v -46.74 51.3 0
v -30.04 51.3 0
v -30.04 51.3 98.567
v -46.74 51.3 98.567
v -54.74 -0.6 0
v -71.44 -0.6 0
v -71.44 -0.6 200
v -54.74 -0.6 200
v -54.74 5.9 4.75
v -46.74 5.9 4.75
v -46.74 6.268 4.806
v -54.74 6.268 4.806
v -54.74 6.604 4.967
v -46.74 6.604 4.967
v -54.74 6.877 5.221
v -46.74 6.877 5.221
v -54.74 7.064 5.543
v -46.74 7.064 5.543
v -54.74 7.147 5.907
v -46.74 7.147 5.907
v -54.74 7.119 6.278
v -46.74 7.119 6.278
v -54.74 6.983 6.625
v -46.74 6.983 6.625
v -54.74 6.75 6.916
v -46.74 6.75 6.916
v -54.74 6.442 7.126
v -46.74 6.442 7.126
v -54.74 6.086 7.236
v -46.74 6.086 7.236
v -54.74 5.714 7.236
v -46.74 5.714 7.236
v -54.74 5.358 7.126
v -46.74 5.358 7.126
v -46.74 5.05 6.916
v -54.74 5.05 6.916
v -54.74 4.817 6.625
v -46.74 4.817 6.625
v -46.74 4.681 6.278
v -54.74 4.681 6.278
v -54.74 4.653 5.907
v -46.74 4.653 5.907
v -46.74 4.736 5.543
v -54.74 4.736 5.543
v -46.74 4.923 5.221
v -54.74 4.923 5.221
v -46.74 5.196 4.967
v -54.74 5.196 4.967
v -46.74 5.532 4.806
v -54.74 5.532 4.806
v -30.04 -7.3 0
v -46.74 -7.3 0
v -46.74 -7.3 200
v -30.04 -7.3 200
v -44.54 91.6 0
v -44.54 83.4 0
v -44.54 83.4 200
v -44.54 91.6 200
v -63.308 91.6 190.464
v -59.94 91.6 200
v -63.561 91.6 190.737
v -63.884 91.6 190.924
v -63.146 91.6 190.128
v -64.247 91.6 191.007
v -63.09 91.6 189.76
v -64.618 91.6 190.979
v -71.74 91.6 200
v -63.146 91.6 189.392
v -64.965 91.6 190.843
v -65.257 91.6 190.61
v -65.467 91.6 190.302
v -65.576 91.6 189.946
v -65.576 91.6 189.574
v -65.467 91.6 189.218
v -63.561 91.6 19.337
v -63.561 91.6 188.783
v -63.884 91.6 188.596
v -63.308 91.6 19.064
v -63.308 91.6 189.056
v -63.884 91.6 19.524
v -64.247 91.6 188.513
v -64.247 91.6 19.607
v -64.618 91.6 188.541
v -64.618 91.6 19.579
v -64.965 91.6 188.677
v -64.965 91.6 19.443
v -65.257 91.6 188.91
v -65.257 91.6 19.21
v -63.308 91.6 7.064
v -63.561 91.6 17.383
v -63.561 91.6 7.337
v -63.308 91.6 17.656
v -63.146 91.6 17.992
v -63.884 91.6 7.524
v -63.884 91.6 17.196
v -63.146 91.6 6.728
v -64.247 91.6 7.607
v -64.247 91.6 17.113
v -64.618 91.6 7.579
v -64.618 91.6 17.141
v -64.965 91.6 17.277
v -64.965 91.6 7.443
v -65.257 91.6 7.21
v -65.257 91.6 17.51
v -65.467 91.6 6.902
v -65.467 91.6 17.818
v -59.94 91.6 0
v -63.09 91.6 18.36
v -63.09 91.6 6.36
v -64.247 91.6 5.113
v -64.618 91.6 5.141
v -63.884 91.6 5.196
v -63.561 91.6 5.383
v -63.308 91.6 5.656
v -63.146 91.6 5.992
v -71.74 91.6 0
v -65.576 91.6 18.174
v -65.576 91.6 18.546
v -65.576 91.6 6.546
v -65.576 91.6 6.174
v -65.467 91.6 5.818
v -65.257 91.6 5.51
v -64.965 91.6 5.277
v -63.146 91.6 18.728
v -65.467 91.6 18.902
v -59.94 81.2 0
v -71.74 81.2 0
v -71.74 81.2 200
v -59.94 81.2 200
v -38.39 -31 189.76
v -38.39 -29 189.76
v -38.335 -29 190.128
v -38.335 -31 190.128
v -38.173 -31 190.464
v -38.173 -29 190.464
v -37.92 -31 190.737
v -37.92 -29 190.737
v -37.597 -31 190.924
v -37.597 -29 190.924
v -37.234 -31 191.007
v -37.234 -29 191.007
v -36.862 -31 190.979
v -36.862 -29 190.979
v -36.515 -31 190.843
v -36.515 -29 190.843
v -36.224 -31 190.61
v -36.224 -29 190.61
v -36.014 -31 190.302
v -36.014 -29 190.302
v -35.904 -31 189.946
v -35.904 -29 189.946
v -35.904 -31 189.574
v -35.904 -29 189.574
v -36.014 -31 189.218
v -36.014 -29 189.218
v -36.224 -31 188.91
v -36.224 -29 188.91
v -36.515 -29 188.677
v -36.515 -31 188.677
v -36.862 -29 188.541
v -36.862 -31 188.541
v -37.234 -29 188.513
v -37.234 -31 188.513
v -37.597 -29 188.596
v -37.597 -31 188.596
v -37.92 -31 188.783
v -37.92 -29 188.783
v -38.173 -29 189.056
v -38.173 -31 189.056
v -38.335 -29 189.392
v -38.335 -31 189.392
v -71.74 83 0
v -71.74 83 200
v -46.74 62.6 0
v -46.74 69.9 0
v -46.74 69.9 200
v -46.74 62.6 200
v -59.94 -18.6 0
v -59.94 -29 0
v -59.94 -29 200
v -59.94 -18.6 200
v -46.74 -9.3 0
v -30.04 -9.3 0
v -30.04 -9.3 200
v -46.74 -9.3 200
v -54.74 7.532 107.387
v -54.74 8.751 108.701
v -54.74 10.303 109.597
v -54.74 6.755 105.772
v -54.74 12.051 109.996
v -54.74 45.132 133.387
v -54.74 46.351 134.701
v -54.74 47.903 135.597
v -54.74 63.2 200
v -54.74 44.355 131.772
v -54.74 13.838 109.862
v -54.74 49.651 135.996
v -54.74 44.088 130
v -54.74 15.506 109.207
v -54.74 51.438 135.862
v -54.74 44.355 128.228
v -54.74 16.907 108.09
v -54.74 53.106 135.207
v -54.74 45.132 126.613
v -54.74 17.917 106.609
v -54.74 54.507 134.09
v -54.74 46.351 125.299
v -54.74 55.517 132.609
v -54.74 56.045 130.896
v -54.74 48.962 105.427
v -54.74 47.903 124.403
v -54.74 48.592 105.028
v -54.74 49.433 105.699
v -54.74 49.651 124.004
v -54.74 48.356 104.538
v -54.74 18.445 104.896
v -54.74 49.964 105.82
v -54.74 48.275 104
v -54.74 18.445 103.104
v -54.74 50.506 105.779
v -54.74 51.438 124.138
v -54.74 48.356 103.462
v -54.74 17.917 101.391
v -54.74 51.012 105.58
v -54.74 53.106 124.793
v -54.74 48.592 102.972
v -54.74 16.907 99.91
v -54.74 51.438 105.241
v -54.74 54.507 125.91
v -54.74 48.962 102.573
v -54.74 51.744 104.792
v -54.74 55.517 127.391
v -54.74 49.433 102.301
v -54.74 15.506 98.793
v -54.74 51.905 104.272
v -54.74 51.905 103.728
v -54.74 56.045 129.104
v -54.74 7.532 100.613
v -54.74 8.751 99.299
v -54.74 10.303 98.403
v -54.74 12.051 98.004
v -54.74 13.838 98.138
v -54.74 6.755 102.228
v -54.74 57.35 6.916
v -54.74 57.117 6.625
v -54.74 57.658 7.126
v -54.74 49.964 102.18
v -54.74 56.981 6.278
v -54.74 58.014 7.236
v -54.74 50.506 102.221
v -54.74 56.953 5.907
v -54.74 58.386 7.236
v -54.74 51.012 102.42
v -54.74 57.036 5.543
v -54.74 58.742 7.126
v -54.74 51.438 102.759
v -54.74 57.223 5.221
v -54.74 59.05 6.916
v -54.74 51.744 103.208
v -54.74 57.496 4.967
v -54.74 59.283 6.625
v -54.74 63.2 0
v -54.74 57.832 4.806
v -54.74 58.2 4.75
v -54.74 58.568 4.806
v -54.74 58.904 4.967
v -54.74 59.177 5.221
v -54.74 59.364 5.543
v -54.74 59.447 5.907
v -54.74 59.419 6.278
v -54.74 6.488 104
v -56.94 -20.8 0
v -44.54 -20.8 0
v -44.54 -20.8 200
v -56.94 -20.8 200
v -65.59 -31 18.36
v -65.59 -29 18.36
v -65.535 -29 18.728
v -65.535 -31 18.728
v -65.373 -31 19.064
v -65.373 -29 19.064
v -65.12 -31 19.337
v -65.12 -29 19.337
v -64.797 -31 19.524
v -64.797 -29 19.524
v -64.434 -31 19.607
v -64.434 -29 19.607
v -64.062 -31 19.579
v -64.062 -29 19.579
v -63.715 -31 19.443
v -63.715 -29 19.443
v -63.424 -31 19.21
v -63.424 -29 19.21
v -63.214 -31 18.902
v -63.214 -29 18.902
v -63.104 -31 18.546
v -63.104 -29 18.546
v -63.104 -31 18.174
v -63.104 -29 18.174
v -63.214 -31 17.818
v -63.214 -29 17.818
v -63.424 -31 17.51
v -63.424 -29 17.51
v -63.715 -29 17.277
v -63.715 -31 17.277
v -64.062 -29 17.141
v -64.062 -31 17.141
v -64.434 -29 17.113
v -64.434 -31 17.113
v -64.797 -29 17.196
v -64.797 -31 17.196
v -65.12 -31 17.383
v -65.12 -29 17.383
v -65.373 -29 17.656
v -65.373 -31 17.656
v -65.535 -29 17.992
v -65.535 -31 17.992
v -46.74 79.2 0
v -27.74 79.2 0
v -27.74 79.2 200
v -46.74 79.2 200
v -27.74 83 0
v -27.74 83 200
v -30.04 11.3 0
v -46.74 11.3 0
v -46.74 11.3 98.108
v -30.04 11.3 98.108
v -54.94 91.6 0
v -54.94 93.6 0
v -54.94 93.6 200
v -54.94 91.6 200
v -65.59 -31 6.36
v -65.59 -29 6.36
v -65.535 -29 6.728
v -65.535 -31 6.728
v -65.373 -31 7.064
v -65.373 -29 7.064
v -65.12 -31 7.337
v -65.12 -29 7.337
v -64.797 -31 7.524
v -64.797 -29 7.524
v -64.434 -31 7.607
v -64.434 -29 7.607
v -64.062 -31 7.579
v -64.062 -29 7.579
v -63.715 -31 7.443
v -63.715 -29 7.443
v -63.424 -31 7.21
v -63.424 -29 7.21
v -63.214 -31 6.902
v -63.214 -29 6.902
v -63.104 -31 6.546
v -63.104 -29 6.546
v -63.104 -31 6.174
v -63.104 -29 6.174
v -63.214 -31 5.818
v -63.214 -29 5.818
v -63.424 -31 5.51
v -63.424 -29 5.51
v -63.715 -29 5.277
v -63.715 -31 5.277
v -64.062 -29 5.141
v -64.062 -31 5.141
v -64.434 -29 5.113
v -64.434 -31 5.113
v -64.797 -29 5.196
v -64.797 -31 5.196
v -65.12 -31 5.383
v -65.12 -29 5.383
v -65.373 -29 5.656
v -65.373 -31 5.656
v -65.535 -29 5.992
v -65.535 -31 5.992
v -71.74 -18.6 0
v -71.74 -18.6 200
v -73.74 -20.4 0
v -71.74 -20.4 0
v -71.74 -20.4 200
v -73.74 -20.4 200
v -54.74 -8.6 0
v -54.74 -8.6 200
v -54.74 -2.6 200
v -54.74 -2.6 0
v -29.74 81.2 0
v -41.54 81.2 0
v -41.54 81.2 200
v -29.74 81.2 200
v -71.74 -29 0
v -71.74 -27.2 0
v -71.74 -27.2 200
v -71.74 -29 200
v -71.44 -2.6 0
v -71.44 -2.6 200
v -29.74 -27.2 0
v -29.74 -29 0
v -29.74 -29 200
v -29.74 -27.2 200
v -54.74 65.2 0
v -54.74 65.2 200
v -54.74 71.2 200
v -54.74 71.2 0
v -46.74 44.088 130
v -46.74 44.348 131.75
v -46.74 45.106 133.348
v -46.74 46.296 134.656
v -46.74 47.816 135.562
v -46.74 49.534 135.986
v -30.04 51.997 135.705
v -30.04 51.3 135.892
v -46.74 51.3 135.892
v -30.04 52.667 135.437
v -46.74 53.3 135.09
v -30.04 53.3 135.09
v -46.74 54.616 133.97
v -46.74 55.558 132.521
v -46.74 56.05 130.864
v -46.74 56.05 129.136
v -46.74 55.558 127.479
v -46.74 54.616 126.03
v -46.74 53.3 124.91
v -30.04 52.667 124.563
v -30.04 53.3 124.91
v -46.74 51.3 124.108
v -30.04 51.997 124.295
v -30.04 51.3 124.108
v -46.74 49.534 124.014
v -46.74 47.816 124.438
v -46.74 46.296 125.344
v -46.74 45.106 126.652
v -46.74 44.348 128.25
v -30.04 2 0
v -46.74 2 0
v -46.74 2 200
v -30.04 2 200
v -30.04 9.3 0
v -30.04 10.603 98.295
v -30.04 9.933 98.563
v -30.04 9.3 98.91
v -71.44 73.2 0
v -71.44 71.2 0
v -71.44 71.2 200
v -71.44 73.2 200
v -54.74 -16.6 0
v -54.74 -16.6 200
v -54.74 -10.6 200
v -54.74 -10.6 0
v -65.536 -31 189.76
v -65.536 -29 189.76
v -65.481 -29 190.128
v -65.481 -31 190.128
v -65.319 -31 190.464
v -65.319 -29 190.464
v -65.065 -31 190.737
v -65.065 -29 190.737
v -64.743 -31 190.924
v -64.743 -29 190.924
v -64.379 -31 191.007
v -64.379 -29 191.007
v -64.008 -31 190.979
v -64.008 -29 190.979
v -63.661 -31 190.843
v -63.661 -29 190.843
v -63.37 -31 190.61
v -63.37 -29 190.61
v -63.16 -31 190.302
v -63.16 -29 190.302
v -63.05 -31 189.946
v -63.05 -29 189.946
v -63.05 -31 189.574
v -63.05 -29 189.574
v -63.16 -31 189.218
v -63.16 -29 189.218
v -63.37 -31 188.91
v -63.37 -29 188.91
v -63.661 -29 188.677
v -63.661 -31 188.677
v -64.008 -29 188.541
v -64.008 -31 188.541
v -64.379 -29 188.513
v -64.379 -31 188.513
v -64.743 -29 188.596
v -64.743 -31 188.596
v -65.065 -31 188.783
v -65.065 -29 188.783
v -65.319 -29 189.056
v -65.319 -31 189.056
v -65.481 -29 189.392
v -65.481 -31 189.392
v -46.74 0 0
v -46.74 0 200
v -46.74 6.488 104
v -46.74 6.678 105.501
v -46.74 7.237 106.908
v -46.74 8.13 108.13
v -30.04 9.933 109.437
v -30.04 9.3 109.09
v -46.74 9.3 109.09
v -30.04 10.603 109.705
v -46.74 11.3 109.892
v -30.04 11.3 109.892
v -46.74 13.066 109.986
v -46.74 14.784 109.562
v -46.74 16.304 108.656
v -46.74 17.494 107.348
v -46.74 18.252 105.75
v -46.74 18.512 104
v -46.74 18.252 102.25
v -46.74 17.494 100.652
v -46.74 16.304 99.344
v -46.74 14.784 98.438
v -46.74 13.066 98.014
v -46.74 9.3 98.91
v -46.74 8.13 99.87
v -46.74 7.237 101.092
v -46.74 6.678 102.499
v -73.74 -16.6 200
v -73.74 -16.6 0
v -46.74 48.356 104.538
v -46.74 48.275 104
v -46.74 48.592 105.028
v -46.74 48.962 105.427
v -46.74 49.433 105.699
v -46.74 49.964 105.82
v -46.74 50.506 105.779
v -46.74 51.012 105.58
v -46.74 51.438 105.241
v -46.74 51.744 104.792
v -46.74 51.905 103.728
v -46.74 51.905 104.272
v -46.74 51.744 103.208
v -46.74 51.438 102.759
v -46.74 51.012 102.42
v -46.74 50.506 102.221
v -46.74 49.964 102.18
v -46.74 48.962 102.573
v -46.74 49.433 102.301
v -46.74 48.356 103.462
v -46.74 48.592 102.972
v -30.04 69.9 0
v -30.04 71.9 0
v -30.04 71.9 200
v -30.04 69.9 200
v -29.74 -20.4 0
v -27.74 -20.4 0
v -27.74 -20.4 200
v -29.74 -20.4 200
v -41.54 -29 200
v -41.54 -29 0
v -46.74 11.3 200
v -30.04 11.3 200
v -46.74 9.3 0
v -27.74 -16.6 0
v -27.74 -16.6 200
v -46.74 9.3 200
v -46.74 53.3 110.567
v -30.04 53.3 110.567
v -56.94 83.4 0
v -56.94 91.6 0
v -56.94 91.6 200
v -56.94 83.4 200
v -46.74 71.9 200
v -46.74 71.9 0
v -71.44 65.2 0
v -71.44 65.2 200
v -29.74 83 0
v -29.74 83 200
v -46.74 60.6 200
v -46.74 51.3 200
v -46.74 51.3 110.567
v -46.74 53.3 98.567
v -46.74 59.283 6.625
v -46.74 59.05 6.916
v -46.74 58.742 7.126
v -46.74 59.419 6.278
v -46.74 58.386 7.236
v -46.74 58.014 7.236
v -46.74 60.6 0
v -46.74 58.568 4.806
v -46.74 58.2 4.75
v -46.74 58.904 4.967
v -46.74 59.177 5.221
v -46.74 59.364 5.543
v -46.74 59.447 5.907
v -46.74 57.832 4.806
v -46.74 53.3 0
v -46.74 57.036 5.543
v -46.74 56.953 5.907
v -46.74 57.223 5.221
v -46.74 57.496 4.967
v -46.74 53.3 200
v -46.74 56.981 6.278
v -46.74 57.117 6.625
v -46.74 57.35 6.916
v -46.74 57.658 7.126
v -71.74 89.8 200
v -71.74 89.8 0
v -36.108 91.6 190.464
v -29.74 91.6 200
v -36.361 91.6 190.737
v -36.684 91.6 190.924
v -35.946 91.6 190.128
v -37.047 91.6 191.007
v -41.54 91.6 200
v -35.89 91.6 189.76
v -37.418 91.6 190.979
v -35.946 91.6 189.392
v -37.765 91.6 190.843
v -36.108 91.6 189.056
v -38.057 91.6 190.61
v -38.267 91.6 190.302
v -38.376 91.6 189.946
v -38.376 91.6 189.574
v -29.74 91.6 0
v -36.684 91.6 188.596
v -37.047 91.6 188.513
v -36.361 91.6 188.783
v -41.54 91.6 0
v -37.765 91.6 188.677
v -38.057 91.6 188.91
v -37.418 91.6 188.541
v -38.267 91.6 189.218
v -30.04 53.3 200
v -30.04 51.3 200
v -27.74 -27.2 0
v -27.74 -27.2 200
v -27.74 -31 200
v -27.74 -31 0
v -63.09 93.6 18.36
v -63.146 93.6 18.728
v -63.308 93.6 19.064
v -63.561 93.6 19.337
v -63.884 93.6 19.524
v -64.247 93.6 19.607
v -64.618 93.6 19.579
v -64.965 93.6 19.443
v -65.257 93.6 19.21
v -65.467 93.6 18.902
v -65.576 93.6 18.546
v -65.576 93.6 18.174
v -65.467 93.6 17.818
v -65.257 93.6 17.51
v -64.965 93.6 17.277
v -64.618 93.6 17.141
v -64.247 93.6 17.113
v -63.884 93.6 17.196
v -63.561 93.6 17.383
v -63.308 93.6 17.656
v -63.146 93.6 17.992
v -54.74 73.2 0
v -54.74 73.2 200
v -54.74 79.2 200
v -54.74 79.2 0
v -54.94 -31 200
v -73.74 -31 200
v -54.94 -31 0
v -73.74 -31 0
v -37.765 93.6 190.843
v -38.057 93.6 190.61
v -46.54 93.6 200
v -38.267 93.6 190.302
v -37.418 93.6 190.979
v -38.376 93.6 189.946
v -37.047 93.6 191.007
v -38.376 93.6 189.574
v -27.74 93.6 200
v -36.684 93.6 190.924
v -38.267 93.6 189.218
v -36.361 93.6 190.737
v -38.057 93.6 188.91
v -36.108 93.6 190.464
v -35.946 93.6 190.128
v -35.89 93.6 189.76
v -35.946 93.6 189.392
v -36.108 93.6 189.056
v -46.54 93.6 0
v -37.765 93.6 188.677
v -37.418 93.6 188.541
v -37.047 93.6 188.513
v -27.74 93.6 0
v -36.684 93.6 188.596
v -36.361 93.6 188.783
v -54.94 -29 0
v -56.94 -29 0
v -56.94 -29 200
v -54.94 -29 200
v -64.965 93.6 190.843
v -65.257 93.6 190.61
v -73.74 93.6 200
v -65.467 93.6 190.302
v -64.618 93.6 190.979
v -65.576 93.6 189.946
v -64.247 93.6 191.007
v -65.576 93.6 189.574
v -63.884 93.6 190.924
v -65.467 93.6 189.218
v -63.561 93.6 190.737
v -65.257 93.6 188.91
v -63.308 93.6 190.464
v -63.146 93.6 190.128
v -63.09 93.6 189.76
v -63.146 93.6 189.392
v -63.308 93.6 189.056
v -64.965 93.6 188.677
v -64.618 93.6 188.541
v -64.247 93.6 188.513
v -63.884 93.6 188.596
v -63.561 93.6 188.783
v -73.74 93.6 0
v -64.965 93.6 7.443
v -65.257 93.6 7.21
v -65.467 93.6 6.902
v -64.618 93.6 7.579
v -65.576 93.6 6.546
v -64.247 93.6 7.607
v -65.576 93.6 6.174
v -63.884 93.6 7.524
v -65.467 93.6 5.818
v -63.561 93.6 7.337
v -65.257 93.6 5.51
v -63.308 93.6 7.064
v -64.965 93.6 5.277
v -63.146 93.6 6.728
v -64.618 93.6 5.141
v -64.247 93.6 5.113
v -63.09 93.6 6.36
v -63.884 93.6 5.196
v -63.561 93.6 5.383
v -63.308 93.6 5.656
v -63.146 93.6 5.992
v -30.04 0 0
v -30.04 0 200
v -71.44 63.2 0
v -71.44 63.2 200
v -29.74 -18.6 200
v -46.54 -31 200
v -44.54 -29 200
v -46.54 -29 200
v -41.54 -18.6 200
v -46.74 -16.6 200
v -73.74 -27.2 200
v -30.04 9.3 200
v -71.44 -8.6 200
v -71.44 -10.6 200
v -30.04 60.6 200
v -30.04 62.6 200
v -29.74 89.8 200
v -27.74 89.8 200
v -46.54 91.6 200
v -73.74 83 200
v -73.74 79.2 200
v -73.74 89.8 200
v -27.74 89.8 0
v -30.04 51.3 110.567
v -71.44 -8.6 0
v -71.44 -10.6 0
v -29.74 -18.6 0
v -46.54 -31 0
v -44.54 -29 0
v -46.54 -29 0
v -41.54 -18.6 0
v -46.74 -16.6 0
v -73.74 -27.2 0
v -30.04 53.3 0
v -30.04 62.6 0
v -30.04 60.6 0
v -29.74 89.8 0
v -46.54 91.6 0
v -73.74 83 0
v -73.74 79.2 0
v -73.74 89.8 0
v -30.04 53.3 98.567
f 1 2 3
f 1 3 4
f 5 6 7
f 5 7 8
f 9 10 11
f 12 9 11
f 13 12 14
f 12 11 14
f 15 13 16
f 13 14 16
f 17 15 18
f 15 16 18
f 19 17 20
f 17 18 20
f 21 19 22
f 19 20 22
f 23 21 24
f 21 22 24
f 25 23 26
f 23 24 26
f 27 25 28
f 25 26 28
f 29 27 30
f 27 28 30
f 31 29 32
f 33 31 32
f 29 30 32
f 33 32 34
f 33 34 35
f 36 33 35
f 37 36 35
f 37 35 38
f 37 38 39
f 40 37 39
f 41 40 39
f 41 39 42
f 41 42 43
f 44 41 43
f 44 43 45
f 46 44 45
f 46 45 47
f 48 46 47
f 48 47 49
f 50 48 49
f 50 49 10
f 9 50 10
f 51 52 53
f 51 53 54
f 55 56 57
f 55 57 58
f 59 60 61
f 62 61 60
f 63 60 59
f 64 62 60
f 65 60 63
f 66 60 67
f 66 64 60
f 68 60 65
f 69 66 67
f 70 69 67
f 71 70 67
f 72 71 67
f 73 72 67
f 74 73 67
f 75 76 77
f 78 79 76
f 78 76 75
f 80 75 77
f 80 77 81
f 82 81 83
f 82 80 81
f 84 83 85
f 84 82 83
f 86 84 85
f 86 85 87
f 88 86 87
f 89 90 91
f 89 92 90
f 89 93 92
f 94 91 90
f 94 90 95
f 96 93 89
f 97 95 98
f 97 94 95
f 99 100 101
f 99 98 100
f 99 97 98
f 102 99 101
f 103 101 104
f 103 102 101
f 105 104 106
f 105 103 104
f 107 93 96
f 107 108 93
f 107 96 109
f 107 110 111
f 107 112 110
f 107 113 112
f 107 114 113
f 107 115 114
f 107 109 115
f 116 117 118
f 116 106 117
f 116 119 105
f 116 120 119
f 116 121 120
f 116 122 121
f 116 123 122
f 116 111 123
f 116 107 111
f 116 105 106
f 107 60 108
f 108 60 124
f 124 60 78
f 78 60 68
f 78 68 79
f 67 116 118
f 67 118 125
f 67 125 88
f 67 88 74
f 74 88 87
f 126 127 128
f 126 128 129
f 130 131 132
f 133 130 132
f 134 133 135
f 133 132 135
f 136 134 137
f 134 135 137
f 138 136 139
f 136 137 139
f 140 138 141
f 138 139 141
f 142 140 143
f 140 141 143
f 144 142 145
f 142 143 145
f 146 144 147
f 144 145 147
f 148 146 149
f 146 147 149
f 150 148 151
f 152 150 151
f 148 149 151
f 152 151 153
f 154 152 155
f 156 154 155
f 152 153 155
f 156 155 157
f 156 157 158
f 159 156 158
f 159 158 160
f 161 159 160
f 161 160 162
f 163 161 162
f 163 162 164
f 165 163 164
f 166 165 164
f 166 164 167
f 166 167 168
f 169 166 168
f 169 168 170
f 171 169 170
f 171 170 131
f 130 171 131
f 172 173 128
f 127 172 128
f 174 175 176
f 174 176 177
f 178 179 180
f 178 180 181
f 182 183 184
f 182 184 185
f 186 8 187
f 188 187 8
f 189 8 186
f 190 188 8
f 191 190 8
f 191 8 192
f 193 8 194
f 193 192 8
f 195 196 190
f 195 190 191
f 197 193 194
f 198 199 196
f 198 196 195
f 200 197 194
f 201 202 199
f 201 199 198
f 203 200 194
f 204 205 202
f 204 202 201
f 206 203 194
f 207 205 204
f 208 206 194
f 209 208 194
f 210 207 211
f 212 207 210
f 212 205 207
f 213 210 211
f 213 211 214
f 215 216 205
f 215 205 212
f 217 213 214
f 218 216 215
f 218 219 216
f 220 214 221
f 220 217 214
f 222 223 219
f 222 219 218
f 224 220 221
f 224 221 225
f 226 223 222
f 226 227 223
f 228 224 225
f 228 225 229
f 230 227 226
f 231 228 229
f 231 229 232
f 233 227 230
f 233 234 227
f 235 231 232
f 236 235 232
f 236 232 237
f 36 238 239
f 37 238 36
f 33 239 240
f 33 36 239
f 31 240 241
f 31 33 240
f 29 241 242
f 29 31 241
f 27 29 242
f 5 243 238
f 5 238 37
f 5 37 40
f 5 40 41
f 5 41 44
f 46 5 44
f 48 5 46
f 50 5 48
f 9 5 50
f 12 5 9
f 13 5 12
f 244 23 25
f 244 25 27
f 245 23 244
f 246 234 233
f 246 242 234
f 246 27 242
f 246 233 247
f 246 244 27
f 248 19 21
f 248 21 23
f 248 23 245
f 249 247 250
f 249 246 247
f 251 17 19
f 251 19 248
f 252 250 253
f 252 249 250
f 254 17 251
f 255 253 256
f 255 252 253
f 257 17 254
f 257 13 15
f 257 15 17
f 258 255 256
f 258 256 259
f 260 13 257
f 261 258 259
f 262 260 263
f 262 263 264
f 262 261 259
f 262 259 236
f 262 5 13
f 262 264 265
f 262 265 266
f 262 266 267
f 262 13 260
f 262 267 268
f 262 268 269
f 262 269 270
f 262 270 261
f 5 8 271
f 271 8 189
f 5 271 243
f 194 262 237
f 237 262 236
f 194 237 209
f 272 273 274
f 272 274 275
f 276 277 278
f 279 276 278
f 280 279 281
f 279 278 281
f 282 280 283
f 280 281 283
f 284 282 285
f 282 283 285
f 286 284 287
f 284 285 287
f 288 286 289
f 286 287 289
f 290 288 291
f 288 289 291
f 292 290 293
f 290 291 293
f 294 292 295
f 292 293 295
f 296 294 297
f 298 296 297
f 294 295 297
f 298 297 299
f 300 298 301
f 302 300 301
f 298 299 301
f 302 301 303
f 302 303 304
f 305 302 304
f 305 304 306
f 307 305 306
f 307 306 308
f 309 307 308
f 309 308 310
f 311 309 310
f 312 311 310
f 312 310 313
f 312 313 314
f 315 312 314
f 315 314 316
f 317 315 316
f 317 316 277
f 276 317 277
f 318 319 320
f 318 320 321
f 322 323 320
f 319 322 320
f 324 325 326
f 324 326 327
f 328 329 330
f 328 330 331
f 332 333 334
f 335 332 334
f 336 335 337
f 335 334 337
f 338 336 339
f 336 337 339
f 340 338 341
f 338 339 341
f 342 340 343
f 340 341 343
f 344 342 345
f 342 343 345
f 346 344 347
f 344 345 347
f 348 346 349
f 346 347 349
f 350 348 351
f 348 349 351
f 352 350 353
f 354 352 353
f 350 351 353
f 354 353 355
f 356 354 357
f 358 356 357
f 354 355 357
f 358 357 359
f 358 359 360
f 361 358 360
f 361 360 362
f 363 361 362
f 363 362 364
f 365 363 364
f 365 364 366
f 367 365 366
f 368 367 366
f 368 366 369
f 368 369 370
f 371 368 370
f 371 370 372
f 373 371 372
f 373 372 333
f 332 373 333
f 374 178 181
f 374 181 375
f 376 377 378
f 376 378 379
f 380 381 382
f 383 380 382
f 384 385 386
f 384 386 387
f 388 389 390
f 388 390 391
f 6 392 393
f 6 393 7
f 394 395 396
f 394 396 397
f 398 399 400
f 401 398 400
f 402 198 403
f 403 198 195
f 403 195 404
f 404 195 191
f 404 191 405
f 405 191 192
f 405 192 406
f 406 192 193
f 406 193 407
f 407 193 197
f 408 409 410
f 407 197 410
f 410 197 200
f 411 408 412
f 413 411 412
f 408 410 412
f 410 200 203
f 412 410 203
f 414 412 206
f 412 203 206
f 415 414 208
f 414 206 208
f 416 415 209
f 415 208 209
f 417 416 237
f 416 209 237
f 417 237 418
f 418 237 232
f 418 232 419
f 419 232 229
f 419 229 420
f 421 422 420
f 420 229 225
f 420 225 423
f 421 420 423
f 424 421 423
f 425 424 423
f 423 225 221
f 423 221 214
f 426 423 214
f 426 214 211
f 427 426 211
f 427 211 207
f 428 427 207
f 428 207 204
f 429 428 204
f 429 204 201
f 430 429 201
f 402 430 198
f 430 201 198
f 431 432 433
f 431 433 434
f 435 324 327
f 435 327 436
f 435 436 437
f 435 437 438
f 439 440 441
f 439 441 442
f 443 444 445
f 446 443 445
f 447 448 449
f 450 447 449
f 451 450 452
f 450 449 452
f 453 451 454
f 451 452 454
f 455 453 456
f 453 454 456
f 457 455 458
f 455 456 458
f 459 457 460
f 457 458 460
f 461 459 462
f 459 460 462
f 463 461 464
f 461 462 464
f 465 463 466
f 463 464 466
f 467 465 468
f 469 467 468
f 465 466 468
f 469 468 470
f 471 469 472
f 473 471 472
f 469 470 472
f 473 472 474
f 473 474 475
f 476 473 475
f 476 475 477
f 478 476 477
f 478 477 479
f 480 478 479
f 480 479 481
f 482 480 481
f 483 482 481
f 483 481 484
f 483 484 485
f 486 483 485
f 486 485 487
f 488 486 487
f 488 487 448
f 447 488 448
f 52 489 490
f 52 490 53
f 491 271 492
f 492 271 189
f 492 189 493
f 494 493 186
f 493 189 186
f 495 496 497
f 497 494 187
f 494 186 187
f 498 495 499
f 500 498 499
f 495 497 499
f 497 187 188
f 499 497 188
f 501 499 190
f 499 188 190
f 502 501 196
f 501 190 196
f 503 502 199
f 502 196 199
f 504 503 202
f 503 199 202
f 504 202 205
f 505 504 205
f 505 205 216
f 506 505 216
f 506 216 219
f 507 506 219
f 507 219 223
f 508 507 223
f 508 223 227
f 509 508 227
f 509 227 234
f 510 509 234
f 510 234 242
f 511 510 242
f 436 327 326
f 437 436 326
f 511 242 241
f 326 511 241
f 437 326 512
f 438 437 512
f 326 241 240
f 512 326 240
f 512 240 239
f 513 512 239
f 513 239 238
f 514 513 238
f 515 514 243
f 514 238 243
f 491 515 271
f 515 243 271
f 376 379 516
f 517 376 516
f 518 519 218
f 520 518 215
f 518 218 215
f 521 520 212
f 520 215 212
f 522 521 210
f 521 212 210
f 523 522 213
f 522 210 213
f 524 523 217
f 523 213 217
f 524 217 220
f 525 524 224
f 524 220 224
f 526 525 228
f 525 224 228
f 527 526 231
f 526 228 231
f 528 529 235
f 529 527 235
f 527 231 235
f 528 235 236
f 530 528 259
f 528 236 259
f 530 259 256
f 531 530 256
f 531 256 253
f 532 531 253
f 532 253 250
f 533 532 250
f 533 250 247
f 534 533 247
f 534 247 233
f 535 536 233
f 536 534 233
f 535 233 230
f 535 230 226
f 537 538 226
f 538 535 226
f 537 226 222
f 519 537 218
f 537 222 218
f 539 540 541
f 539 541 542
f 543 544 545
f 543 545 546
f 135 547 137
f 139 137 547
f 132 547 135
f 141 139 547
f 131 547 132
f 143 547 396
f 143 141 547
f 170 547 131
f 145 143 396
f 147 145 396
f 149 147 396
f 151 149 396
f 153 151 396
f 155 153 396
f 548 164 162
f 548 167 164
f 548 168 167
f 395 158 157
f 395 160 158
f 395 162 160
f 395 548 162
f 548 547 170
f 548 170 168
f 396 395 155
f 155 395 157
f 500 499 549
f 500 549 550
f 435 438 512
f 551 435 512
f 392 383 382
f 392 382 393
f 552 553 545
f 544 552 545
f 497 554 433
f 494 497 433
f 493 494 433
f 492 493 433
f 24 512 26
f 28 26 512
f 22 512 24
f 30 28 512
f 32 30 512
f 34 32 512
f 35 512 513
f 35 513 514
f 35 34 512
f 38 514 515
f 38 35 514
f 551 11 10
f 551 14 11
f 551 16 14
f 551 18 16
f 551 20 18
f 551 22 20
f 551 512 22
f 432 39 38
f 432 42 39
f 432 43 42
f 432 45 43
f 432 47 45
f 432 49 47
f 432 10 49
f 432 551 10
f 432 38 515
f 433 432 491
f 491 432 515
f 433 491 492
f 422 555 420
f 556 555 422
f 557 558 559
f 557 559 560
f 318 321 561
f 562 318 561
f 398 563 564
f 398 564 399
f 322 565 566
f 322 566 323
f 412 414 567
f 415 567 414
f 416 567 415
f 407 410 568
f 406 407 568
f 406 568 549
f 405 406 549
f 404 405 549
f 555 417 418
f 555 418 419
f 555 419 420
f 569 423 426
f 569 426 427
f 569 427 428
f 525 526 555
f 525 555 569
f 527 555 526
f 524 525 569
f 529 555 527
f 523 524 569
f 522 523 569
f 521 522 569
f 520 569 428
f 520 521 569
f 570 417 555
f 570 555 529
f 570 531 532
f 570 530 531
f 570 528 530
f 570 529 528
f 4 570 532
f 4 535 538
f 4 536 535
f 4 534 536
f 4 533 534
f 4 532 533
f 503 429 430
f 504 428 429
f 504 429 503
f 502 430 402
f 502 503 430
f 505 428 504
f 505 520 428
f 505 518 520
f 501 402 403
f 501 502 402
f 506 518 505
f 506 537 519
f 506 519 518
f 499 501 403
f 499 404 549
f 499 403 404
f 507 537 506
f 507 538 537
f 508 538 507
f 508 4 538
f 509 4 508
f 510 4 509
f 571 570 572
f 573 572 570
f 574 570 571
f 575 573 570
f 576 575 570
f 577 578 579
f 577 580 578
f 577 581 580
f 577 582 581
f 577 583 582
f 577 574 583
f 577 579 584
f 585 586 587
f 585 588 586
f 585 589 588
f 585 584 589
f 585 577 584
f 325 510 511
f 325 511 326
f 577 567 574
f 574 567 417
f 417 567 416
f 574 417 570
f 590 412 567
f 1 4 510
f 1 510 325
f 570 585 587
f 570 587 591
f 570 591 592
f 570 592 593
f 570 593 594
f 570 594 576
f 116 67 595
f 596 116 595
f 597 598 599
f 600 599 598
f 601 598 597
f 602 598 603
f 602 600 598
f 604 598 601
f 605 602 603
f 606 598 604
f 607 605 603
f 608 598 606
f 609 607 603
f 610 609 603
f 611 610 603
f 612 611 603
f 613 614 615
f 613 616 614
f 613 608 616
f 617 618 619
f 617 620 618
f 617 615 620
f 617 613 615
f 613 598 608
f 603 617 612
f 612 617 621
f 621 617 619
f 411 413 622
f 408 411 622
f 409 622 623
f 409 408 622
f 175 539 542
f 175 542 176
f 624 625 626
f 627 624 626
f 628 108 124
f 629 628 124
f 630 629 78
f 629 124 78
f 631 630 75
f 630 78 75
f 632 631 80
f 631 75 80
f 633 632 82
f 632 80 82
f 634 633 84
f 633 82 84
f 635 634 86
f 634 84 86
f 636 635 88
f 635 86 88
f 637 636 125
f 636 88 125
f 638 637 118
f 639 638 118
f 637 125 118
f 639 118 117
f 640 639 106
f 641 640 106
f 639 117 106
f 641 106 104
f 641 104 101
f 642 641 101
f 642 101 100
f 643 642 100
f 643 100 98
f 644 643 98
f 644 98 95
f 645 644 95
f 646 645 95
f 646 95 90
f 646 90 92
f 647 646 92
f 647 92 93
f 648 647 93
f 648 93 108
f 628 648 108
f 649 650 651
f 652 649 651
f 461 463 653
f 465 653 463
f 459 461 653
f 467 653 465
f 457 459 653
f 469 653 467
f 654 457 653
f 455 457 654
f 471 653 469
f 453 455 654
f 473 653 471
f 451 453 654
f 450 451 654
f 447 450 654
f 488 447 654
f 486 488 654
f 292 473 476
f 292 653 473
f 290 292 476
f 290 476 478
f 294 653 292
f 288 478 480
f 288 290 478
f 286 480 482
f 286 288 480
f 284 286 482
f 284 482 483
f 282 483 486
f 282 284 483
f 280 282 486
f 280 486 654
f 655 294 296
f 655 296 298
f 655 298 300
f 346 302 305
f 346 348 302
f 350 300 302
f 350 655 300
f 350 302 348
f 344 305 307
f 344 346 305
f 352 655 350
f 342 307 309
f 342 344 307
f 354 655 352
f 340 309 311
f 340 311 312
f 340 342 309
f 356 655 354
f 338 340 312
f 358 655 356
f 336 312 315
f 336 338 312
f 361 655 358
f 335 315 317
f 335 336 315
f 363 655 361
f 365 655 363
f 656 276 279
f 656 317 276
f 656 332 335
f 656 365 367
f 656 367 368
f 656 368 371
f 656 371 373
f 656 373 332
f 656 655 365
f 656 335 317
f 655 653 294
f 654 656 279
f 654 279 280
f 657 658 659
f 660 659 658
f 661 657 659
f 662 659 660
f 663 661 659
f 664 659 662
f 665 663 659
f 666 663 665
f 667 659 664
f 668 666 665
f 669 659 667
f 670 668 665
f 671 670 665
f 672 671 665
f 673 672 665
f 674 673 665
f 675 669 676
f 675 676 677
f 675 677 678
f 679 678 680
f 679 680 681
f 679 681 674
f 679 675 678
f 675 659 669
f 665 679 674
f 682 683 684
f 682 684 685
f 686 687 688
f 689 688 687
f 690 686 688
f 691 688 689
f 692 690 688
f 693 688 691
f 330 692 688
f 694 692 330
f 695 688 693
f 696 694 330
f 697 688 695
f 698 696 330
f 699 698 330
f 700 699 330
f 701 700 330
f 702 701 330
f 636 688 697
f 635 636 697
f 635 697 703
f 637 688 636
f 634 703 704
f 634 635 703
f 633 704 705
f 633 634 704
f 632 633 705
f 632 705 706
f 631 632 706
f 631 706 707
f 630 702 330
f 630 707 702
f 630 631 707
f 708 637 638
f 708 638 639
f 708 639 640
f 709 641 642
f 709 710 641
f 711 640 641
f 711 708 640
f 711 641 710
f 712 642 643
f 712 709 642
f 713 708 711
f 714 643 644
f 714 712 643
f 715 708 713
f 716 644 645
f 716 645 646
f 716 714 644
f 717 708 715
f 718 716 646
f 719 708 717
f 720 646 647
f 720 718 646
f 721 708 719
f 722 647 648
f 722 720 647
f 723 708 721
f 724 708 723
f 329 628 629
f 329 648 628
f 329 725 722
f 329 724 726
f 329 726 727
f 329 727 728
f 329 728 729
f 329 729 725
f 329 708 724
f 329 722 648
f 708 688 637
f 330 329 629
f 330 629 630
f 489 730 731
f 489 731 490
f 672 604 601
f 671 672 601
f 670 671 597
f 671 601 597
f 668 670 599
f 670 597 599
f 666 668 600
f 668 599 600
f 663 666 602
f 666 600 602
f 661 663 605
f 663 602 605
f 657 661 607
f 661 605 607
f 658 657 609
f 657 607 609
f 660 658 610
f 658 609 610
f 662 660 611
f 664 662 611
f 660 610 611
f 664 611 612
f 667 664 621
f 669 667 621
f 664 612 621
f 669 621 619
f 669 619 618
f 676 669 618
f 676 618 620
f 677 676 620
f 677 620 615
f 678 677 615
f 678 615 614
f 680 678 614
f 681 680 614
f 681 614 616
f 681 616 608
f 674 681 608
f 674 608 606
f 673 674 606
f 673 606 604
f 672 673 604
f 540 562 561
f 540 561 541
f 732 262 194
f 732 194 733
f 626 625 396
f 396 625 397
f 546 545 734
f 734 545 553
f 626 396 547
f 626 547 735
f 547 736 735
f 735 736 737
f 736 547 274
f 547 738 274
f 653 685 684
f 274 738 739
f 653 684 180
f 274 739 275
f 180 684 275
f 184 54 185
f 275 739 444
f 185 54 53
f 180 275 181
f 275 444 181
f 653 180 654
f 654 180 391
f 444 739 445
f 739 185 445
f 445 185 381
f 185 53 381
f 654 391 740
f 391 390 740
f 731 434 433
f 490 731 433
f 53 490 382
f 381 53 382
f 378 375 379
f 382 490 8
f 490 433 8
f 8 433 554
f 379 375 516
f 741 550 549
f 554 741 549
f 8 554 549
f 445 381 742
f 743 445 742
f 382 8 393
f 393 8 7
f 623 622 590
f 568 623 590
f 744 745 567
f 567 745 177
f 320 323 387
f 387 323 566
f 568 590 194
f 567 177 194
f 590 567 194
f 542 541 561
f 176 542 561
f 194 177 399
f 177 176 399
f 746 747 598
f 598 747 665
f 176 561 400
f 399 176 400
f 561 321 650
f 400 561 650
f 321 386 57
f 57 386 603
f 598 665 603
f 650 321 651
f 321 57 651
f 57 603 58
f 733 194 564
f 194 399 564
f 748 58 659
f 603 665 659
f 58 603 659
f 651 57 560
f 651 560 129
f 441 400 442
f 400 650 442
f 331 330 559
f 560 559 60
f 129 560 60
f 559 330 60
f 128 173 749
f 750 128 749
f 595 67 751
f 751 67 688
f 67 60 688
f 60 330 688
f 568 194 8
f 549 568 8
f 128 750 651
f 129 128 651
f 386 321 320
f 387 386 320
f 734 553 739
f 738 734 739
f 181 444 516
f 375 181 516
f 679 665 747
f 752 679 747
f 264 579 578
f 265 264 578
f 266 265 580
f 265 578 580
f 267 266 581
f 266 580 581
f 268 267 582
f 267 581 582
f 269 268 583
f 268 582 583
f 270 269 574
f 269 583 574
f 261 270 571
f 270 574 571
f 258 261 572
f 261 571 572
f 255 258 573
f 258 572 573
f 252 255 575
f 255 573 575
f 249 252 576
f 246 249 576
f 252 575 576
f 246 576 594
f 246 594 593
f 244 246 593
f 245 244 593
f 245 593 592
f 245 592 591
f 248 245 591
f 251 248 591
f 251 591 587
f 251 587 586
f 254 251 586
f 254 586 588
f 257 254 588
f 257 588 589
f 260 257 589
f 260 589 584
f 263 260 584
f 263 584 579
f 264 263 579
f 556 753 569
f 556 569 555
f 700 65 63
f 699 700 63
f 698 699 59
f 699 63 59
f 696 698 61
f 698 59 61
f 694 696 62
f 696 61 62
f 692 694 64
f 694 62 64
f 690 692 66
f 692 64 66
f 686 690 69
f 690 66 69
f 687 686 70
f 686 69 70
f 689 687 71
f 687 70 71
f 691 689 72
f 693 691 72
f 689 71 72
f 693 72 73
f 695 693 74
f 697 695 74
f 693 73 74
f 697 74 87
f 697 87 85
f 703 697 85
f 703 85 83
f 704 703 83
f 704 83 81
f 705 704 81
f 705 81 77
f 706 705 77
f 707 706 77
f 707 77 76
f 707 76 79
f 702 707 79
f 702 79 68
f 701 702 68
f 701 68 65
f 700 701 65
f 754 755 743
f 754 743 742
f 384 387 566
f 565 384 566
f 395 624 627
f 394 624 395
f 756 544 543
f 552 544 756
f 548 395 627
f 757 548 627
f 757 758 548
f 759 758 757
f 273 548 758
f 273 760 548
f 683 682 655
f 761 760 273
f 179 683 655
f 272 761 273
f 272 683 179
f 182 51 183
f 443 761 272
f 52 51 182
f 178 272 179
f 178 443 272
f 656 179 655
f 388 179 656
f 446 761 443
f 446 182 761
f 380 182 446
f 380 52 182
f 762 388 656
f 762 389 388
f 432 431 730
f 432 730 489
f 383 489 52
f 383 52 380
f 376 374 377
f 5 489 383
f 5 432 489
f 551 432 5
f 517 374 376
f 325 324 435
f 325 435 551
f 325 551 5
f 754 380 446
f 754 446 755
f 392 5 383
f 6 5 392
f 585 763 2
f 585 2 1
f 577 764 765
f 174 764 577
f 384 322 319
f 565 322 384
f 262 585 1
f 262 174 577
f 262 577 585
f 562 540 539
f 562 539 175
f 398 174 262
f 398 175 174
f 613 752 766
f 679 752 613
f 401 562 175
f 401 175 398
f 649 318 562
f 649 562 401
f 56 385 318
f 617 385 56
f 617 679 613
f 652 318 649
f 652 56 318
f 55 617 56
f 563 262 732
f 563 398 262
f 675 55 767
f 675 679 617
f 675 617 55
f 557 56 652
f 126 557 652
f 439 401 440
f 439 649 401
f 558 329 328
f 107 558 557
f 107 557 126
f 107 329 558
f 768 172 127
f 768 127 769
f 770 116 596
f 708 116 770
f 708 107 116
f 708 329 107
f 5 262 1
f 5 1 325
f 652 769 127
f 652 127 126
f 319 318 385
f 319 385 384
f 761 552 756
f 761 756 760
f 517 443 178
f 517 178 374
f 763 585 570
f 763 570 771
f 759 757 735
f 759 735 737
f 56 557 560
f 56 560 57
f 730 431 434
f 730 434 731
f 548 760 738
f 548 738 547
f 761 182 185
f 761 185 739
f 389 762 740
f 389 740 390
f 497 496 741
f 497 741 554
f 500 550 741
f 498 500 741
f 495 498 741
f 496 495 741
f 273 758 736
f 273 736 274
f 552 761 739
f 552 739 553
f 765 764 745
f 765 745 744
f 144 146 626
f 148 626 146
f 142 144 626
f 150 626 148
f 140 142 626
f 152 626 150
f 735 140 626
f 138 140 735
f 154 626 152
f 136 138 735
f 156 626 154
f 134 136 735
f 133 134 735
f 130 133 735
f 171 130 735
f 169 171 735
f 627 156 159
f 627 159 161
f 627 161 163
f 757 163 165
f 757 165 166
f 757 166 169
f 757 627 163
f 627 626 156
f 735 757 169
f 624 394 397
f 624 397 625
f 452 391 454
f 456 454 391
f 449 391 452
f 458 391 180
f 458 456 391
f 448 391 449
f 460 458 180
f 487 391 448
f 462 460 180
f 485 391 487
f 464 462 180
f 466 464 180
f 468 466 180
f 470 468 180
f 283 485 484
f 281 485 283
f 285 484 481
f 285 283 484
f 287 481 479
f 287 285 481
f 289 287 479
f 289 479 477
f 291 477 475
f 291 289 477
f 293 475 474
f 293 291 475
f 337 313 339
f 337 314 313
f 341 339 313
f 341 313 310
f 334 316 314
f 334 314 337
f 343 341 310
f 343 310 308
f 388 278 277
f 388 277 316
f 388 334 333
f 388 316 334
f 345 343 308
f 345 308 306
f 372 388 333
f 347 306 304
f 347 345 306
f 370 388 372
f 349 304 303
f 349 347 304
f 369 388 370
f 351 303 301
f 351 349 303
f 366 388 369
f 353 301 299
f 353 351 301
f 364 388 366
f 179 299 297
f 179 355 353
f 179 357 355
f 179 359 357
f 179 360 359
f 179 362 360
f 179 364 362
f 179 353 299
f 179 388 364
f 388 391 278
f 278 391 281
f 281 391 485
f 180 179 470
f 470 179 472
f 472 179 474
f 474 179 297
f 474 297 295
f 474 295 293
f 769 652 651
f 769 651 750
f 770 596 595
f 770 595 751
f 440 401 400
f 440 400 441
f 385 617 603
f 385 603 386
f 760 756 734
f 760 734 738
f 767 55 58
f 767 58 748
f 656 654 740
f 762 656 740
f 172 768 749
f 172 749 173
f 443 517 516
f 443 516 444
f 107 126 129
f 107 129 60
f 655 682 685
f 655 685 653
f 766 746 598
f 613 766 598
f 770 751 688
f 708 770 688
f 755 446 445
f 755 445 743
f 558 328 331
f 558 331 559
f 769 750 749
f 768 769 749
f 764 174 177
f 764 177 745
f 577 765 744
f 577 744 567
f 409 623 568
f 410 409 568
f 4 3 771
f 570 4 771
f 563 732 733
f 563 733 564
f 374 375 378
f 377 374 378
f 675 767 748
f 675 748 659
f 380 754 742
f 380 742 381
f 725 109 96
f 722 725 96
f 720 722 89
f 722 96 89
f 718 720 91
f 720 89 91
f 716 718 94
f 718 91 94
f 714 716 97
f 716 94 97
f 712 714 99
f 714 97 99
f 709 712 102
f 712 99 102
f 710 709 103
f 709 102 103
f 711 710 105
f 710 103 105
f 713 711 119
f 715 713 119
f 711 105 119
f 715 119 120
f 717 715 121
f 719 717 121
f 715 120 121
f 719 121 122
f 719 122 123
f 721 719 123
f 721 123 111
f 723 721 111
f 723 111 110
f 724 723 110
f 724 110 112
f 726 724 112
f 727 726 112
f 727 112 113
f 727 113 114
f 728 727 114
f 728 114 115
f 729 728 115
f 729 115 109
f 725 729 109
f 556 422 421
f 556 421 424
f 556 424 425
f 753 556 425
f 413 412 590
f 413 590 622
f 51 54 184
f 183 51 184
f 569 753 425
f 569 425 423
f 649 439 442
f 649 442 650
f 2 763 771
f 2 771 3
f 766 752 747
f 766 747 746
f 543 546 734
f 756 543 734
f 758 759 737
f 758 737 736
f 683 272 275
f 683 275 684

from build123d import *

# Parameters (mm, degrees)
RESSALTO_EXTRUS_O1_DEPTH                     = 200
CORTE_EXTRUS_O3_REACH                        = 224.463
ESBO_O4_R                                    = 1.825
CORTE_EXTRUS_O5_REACH                        = 224.463
ESBO_O6_R                                    = 6.0125
BROCA_DE_ROSQUEAR_PARA_TARRAXA_DE_M3X0_5_D   = 2.5
ESBO_O15_W                                   = 12
ESBO_O15_H                                   = 2.152025528
CORTE_EXTRUS_O7_DEPTH                        = 16.7
CORTE_EXTRUS_O8_REACH                        = 224.463
ESBO_O5_R                                    = 6.0125
BROCA_DE_ROSQUEAR_PARA_TARRAXA_DE_M3_2_D     = 2.5
BROCA_DE_ROSQUEAR_PARA_TARRAXA_DE_M3_2_DEPTH = 2
BROCA_DE_ROSQUEAR_PARA_TARRAXA_DE_M3_3_D     = 2.5
BROCA_DE_ROSQUEAR_PARA_TARRAXA_DE_M3_3_DEPTH = 2
BROCA_DE_ROSQUEAR_PARA_TARRAXA_DE_M3_4_D     = 2.5
BROCA_DE_ROSQUEAR_PARA_TARRAXA_DE_M3_4_DEPTH = 2
BROCA_DE_ROSQUEAR_PARA_TARRAXA_DE_M3_5_D     = 2.5
BROCA_DE_ROSQUEAR_PARA_TARRAXA_DE_M3_5_DEPTH = 2


with BuildPart() as part:
    # Esboço1 → Ressalto-extrusão1 (new body)
    with BuildSketch(Plane.XY):
        Polygon((-54.740307174, -0.6), (-54.740307174, 63.2), (-71.440307174, 63.2), (-71.440307174, 65.2), (-54.740307174, 65.2), (-54.740307174, 71.2), (-71.440307174, 71.2), (-71.440307174, 73.2), (-54.740307174, 73.2), (-54.740307174, 79.2), (-73.740307174, 79.2), (-73.740307174, 83), (-71.740307174, 83), (-71.740307174, 81.2), (-59.940307174, 81.2), (-59.940307174, 91.6), (-71.740307174, 91.6), (-71.740307174, 89.8), (-73.740307174, 89.8), (-73.740307174, 93.6), (-54.940307174, 93.6), (-54.940307174, 91.6), (-56.940307174, 91.6), (-56.940307174, 83.4), (-44.540307174, 83.4), (-44.540307174, 91.6), (-46.540307174, 91.6), (-46.540307174, 93.6), (-27.740307174, 93.6), (-27.740307174, 89.8), (-29.740307174, 89.8), (-29.740307174, 91.6), (-41.540307174, 91.6), (-41.540307174, 81.2), (-29.740307174, 81.2), (-29.740307174, 83), (-27.740307174, 83), (-27.740307174, 79.2), (-46.740307174, 79.2), (-46.740307174, 71.9), (-30.040307174, 71.9), (-30.040307174, 69.9), (-46.740307174, 69.9), (-46.740307174, 62.6), (-30.040307174, 62.6), (-30.040307174, 60.6), (-46.740307174, 60.6), (-46.740307174, 53.3), (-30.040307174, 53.3), (-30.040307174, 51.3), (-46.740307174, 51.3), (-46.740307174, 11.3), (-30.040307174, 11.3), (-30.040307174, 9.3), (-46.740307174, 9.3), (-46.740307174, 2), (-30.040307174, 2), (-30.040307174, 0), (-46.740307174, 0), (-46.740307174, -7.3), (-30.040307174, -7.3), (-30.040307174, -9.3), (-46.740307174, -9.3), (-46.740307174, -16.6), (-27.740307174, -16.6), (-27.740307174, -20.4), (-29.740307174, -20.4), (-29.740307174, -18.6), (-41.540307174, -18.6), (-41.540307174, -29), (-29.740307174, -29), (-29.740307174, -27.2), (-27.740307174, -27.2), (-27.740307174, -31), (-46.540307174, -31), (-46.540307174, -29), (-44.540307174, -29), (-44.540307174, -20.8), (-56.940307174, -20.8), (-56.940307174, -29), (-54.940307174, -29), (-54.940307174, -31), (-73.740307174, -31), (-73.740307174, -27.2), (-71.740307174, -27.2), (-71.740307174, -29), (-59.940307174, -29), (-59.940307174, -18.6), (-71.740307174, -18.6), (-71.740307174, -20.4), (-73.740307174, -20.4), (-73.740307174, -16.6), (-54.740307174, -16.6), (-54.740307174, -10.6), (-71.440307174, -10.6), (-71.440307174, -8.6), (-54.740307174, -8.6), (-54.740307174, -2.6), (-71.440307174, -2.6), (-71.440307174, -0.6), align=None)
    extrude(amount=RESSALTO_EXTRUS_O1_DEPTH)

    # Esboço4 → Corte-extrusão3 (cut, up to next)
    with BuildSketch(Plane.ZY.offset(54.740307174), mode=Mode.PRIVATE) as corte_extrus_o3_sk1:
        with Locations(Location((104, 50.1, 0), (0, 0, 270))):
            Circle(ESBO_O4_R)
    corte_extrus_o3_tool1 = extrude(corte_extrus_o3_sk1.sketch, amount=-CORTE_EXTRUS_O3_REACH, mode=Mode.PRIVATE) & part.part
    add(corte_extrus_o3_tool1.solids().sort_by_distance((-54.740307, 50.1, 104))[0], mode=Mode.SUBTRACT)

    # Esboço6 → Corte-extrusão5 (cut, up to next)
    with BuildSketch(Plane.ZY.offset(54.740307174), mode=Mode.PRIVATE) as corte_extrus_o5_sk1:
        with Locations(Location((104, 12.5, 0), (0, 0, 270))):
            Circle(ESBO_O6_R)
    corte_extrus_o5_tool1 = extrude(corte_extrus_o5_sk1.sketch, amount=-CORTE_EXTRUS_O5_REACH, mode=Mode.PRIVATE) & part.part
    add(corte_extrus_o5_tool1.solids().sort_by_distance((-54.740307, 12.5, 104))[0], mode=Mode.SUBTRACT)

    # Broca de rosquear para tarraxa de M3x0.5 (through all)
    with Locations(Plane.ZY.offset(54.740307174)):
        with Locations((6, 5.9), (6, 58.2)):
            Hole(BROCA_DE_ROSQUEAR_PARA_TARRAXA_DE_M3X0_5_D / 2)

    # Esboço15 → Corte-extrusão7 (cut)
    with BuildSketch(Plane(origin=(-30.040307174, 0, 0), x_dir=(0, 0, -1), z_dir=(1, 0, 0))):
        with Locations((-104.566575702, 52.223987236)):
            Rectangle(ESBO_O15_W, ESBO_O15_H)
    extrude(amount=-CORTE_EXTRUS_O7_DEPTH, mode=Mode.SUBTRACT)

    # Esboço5 → Corte-extrusão8 (cut, up to next)
    with BuildSketch(Plane.ZY.offset(54.740307174), mode=Mode.PRIVATE) as corte_extrus_o8_sk1:
        with Locations(Location((130, 50.1, 0), (0, 0, 270))):
            Circle(ESBO_O5_R)
    corte_extrus_o8_tool1 = extrude(corte_extrus_o8_sk1.sketch, amount=-CORTE_EXTRUS_O8_REACH, mode=Mode.PRIVATE) & part.part
    add(corte_extrus_o8_tool1.solids().sort_by_distance((-54.740307, 50.1, 130))[0], mode=Mode.SUBTRACT)

    # Broca de rosquear para tarraxa de M3 2
    with Locations(Plane.XZ.offset(31)):
        with Locations((-64.286083069, 189.76), (-37.140307173, 189.76)):
            Hole(BROCA_DE_ROSQUEAR_PARA_TARRAXA_DE_M3_2_D / 2, depth=BROCA_DE_ROSQUEAR_PARA_TARRAXA_DE_M3_2_DEPTH)

    # Broca de rosquear para tarraxa de M3 3
    with Locations(Plane(origin=(0, 93.6, 0), x_dir=(-1, 0, 0), z_dir=(0, 1, 0))):
        with Locations((37.140307173, 189.76), (64.340307173, 189.76)):
            Hole(BROCA_DE_ROSQUEAR_PARA_TARRAXA_DE_M3_3_D / 2, depth=BROCA_DE_ROSQUEAR_PARA_TARRAXA_DE_M3_3_DEPTH)

    # Broca de rosquear para tarraxa de M3 4
    with Locations(Plane.XZ.offset(31)):
        with Locations((-64.340307174, 18.36), (-64.340307174, 6.36)):
            Hole(BROCA_DE_ROSQUEAR_PARA_TARRAXA_DE_M3_4_D / 2, depth=BROCA_DE_ROSQUEAR_PARA_TARRAXA_DE_M3_4_DEPTH)

    # Broca de rosquear para tarraxa de M3 5
    with Locations(Plane(origin=(0, 93.6, 0), x_dir=(-1, 0, 0), z_dir=(0, 1, 0))):
        with Locations((64.340307174, 18.36), (64.340307174, 6.36)):
            Hole(BROCA_DE_ROSQUEAR_PARA_TARRAXA_DE_M3_5_D / 2, depth=BROCA_DE_ROSQUEAR_PARA_TARRAXA_DE_M3_5_DEPTH)


solid = part.part
